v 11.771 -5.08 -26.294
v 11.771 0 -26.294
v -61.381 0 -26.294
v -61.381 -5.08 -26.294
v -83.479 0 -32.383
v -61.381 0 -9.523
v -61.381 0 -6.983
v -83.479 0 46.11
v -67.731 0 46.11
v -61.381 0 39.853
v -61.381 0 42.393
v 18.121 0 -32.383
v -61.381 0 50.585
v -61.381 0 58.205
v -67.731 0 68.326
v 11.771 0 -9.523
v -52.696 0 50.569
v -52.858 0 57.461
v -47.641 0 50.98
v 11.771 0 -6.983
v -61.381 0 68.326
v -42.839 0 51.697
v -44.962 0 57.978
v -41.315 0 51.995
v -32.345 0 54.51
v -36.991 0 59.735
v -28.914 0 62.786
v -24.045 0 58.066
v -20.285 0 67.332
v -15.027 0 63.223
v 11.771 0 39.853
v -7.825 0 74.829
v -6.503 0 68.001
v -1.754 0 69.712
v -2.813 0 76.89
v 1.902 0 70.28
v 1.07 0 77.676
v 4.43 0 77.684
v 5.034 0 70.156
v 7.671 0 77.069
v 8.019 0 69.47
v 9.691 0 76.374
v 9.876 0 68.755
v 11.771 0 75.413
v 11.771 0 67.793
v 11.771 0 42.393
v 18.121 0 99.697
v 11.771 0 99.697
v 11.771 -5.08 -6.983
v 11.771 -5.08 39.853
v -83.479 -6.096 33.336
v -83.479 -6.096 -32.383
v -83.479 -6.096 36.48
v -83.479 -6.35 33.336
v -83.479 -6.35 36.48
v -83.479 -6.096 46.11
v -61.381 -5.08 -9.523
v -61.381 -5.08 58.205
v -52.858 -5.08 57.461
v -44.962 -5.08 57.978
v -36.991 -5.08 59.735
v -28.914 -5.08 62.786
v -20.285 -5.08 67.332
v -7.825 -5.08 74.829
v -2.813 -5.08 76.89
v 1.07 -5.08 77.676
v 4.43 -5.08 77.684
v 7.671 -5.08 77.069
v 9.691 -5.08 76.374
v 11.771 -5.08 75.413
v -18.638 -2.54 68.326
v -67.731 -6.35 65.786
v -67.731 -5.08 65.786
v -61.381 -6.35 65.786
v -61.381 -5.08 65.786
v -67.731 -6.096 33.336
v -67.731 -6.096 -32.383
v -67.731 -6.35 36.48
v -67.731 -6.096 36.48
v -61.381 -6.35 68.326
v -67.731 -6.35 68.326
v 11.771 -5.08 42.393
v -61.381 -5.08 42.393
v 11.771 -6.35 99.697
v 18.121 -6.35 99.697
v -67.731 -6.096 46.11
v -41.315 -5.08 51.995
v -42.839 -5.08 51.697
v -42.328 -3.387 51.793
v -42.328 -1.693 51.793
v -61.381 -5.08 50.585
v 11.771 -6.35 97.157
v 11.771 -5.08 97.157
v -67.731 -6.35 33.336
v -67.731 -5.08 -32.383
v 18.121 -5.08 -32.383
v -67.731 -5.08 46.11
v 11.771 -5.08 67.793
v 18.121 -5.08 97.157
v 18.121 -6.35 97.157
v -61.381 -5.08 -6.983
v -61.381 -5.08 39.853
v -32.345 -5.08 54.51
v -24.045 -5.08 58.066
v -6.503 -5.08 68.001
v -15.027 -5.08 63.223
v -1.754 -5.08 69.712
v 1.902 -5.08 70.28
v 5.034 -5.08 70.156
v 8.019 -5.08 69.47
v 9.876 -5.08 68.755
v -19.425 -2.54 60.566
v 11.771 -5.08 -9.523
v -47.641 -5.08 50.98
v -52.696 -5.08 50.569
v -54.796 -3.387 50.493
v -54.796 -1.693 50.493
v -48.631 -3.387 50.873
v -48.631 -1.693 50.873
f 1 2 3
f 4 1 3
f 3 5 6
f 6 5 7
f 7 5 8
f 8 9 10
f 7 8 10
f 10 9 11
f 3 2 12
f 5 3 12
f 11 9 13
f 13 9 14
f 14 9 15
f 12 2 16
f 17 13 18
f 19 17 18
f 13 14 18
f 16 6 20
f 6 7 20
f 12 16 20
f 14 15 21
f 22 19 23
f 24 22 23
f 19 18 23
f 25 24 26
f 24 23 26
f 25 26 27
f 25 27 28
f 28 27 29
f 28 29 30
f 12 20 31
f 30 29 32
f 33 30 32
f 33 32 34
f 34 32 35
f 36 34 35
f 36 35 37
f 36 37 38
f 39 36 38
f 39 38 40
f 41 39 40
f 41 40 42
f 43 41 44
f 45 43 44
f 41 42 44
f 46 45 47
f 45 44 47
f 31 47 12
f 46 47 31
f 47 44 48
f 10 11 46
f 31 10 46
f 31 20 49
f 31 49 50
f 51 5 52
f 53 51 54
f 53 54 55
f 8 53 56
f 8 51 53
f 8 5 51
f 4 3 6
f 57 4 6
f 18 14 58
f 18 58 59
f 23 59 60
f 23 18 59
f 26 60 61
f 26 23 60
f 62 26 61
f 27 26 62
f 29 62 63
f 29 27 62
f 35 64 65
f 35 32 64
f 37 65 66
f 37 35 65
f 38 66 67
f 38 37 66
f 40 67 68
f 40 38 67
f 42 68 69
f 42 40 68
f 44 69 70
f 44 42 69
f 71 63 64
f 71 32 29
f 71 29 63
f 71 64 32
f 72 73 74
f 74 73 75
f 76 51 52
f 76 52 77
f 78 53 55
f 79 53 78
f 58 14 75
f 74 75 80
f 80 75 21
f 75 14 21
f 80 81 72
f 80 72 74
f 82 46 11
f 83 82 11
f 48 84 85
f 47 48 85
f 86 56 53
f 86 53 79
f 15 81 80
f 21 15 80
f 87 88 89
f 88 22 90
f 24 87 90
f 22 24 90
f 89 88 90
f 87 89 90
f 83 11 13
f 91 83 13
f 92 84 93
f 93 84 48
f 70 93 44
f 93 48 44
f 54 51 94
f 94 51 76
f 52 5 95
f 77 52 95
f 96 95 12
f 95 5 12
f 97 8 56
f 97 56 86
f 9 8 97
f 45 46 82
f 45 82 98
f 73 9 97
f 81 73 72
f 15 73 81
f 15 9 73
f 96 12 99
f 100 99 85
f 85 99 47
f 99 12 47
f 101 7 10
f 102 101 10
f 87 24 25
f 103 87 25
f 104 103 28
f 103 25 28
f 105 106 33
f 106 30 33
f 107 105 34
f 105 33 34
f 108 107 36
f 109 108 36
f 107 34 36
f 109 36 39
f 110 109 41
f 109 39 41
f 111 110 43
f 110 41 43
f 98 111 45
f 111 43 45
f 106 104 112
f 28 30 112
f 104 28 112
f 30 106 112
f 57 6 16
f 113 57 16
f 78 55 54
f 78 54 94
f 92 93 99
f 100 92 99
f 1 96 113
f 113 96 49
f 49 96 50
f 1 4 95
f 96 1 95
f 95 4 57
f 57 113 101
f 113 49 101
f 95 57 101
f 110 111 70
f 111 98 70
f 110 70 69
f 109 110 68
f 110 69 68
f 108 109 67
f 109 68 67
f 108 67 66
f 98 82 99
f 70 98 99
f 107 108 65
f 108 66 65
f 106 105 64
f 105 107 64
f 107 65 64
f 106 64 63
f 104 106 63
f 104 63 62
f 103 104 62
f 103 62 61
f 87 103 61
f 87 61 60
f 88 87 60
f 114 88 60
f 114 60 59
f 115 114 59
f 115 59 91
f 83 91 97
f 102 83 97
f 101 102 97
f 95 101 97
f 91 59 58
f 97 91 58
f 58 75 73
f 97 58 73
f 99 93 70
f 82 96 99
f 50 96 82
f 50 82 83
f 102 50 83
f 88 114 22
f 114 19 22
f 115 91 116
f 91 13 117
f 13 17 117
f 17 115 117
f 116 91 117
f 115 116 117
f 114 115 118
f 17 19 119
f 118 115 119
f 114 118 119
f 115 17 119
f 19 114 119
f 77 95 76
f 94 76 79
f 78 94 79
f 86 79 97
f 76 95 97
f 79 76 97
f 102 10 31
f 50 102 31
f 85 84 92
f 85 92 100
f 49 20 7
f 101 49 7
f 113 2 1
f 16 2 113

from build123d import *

# Parameters (mm, degrees)
F0_W     = 1.524
F0_H     = 2.54
F0_W_2   = 18.542
F0_W_3   = 53.086
F1_DEPTH = 5.08
F0_W_4   = 6.35
F0_W_5   = 15.748
F0_H_2   = 3.1443536282
F2_DEPTH = 6.35
F0_H_3   = 9.6294713412
F0_H_4   = 65.7186827598
F3_DEPTH = 6.096
F4_DEPTH = 5.08
F5_DEPTH = 5.08
F6_DEPTH = 5.08


with BuildPart() as f1:
    # F0 (on Front) → F1 (new body)
    with BuildSketch(Plane.XZ):
        with BuildLine():
            add(Edge.make_bspline(
                [(-61.3806553816, 58.2051597101), (-43.8441733015, 55.3503870336), (-19.0644229117, 65.9568732466), (0, 81.5450566713), (11.7713446184, 75.4133064361)],
                knots=[0, 0, 0, 0, 0.5425588266, 1, 1, 1, 1], degree=3))
            Line((-61.3806553816, 58.2051597101), (-61.3806553816, 50.5851597101))
            add(Edge.make_bspline(
                [(-61.3806553816, 50.5851597101), (-54.5700391068, 50.2481911872), (-48.4601444481, 50.6597637989), (-42.8386553816, 51.696558085)],
                knots=[0, 0, 0, 0, 0.2106262028, 0.2106262028, 0.2106262028, 0.2106262028], degree=3))
            add(Edge.make_bspline(
                [(-42.8386553816, 51.696558085), (-42.3266573649, 51.7909879792), (-41.8187108352, 51.8906042954), (-41.3146553816, 51.9953138621)],
                knots=[0.2106262028, 0.2106262028, 0.2106262028, 0.2106262028, 0.2298097673, 0.2298097673, 0.2298097673, 0.2298097673], degree=3))
            add(Edge.make_bspline(
                [(-41.3146553816, 51.9953138621), (-33.2393780699, 53.6728252996), (-15.5050873091, 61.1527435678), (0.0995686219, 74.4364412814), (11.7713446184, 67.7933064361)],
                knots=[0.2298097673, 0.2298097673, 0.2298097673, 0.2298097673, 0.5371422287, 1, 1, 1, 1], degree=3))
            Line((11.7713446184, 67.7933064361), (11.7713446184, 75.4133064361))
        make_face()
        Polygon((-67.7306553816, 65.7861350714), (-67.7306553816, 46.1095218752), (-67.7306553816, 36.480050534), (-67.7306553816, 33.3356969059), (-67.7306553816, -32.382985854), (-61.3806553816, -32.382985854), (-61.3806553816, -26.2942135113), (-61.3806553816, -9.522985854), (-61.3806553816, -6.982985854), (-61.3806553816, -1.905), (-61.3806553816, -0.9525), (-61.3806553816, 0), (-61.3806553816, 10.16), (-61.3806553816, 11.1125), (-61.3806553816, 12.065), (-61.3806553816, 20.997421816), (-61.3806553816, 22.267421816), (-61.3806553816, 39.8533064361), (-61.3806553816, 42.3933064361), (-61.3806553816, 42.9651597101), (-61.3806553816, 50.5851597101), (-61.3806553816, 58.2051597101), (-61.3806553816, 65.7861350714), align=None)
        Polygon((-61.3806553816, -26.2942135113), (-61.3806553816, -32.382985854), (11.7713446184, -32.382985854), (11.7713446184, -26.2942135113), (-41.3146553816, -26.2942135113), (-42.8386553816, -26.2942135113), align=None)
        Polygon((11.7713446184, 97.157014146), (11.7713446184, 75.4133064361), (11.7713446184, 67.7933064361), (11.7713446184, 46.1095218752), (11.7713446184, 42.3933064361), (11.7713446184, 39.8533064361), (11.7713446184, 22.267421816), (11.7713446184, 20.997421816), (11.7713446184, 19.2415746087), (11.7713446184, 17.9715746087), (11.7713446184, 12.065), (11.7713446184, 11.1125), (11.7713446184, 10.16), (11.7713446184, 0), (11.7713446184, -0.9525), (11.7713446184, -1.905), (11.7713446184, -6.982985854), (11.7713446184, -9.522985854), (11.7713446184, -26.2942135113), (11.7713446184, -32.382985854), (18.1213446184, -32.382985854), (18.1213446184, 97.157014146), align=None)
        with Locations((-42.0766553816, -8.252985854)):
            Rectangle(F0_W, F0_H)
        with Locations((-52.1096553816, -8.252985854)):
            Rectangle(F0_W_2, F0_H)
        with Locations((-14.7716553816, -8.252985854)):
            Rectangle(F0_W_3, F0_H)
        with Locations((-14.7716553816, 41.1233064361)):
            Rectangle(F0_W_3, F0_H)
        with Locations((-52.1096553816, 41.1233064361)):
            Rectangle(F0_W_2, F0_H)
        with Locations((-42.0766553816, 41.1233064361)):
            Rectangle(F0_W, F0_H)
    extrude(amount=F1_DEPTH)

    # F0 (on Front) → F2 (join)
    with BuildSketch(Plane.XZ):
        with Locations((-64.5556553816, 67.0561350714)):
            Rectangle(F0_W_4, F0_H)
        with Locations((14.9463446184, 98.427014146)):
            Rectangle(F0_W_4, F0_H)
        with Locations((-75.6046553816, 34.9078737199)):
            Rectangle(F0_W_5, F0_H_2)
    extrude(amount=F2_DEPTH)

    # F0 (on Front) → F3 (join)
    with BuildSketch(Plane.XZ):
        with Locations((-75.6046553816, 41.2947862046)):
            Rectangle(F0_W_5, F0_H_3)
        with Locations((-75.6046553816, 0.4763555259)):
            Rectangle(F0_W_5, F0_H_4)
    extrude(amount=F3_DEPTH)

    # F0 (on Front) → F4 (cut)
    with BuildSketch(Plane.XZ):
        with Locations((-52.1096553816, 41.1233064361)):
            Rectangle(F0_W_2, F0_H)
        with Locations((-42.0766553816, 41.1233064361)):
            Rectangle(F0_W, F0_H)
        with Locations((-14.7716553816, 41.1233064361)):
            Rectangle(F0_W_3, F0_H)
    extrude(amount=F4_DEPTH, mode=Mode.SUBTRACT)

    # F0 (on Front) → F5 (cut)
    with BuildSketch(Plane.XZ):
        with Locations((-52.1096553816, -8.252985854)):
            Rectangle(F0_W_2, F0_H)
        with Locations((-42.0766553816, -8.252985854)):
            Rectangle(F0_W, F0_H)
        with Locations((-14.7716553816, -8.252985854)):
            Rectangle(F0_W_3, F0_H)
    extrude(amount=F5_DEPTH, mode=Mode.SUBTRACT)

    # F0 (on Front) → F6 (join)
    with BuildSketch(Plane.XZ):
        with Locations((-14.7716553816, 41.1233064361)):
            Rectangle(F0_W_3, F0_H)
        with Locations((-52.1096553816, 41.1233064361)):
            Rectangle(F0_W_2, F0_H)
        with Locations((-42.0766553816, 41.1233064361)):
            Rectangle(F0_W, F0_H)
        with Locations((-52.1096553816, -8.252985854)):
            Rectangle(F0_W_2, F0_H)
        with Locations((-14.7716553816, -8.252985854)):
            Rectangle(F0_W_3, F0_H)
        with Locations((-42.0766553816, -8.252985854)):
            Rectangle(F0_W, F0_H)
    extrude(amount=F6_DEPTH)


solid = f1.part
